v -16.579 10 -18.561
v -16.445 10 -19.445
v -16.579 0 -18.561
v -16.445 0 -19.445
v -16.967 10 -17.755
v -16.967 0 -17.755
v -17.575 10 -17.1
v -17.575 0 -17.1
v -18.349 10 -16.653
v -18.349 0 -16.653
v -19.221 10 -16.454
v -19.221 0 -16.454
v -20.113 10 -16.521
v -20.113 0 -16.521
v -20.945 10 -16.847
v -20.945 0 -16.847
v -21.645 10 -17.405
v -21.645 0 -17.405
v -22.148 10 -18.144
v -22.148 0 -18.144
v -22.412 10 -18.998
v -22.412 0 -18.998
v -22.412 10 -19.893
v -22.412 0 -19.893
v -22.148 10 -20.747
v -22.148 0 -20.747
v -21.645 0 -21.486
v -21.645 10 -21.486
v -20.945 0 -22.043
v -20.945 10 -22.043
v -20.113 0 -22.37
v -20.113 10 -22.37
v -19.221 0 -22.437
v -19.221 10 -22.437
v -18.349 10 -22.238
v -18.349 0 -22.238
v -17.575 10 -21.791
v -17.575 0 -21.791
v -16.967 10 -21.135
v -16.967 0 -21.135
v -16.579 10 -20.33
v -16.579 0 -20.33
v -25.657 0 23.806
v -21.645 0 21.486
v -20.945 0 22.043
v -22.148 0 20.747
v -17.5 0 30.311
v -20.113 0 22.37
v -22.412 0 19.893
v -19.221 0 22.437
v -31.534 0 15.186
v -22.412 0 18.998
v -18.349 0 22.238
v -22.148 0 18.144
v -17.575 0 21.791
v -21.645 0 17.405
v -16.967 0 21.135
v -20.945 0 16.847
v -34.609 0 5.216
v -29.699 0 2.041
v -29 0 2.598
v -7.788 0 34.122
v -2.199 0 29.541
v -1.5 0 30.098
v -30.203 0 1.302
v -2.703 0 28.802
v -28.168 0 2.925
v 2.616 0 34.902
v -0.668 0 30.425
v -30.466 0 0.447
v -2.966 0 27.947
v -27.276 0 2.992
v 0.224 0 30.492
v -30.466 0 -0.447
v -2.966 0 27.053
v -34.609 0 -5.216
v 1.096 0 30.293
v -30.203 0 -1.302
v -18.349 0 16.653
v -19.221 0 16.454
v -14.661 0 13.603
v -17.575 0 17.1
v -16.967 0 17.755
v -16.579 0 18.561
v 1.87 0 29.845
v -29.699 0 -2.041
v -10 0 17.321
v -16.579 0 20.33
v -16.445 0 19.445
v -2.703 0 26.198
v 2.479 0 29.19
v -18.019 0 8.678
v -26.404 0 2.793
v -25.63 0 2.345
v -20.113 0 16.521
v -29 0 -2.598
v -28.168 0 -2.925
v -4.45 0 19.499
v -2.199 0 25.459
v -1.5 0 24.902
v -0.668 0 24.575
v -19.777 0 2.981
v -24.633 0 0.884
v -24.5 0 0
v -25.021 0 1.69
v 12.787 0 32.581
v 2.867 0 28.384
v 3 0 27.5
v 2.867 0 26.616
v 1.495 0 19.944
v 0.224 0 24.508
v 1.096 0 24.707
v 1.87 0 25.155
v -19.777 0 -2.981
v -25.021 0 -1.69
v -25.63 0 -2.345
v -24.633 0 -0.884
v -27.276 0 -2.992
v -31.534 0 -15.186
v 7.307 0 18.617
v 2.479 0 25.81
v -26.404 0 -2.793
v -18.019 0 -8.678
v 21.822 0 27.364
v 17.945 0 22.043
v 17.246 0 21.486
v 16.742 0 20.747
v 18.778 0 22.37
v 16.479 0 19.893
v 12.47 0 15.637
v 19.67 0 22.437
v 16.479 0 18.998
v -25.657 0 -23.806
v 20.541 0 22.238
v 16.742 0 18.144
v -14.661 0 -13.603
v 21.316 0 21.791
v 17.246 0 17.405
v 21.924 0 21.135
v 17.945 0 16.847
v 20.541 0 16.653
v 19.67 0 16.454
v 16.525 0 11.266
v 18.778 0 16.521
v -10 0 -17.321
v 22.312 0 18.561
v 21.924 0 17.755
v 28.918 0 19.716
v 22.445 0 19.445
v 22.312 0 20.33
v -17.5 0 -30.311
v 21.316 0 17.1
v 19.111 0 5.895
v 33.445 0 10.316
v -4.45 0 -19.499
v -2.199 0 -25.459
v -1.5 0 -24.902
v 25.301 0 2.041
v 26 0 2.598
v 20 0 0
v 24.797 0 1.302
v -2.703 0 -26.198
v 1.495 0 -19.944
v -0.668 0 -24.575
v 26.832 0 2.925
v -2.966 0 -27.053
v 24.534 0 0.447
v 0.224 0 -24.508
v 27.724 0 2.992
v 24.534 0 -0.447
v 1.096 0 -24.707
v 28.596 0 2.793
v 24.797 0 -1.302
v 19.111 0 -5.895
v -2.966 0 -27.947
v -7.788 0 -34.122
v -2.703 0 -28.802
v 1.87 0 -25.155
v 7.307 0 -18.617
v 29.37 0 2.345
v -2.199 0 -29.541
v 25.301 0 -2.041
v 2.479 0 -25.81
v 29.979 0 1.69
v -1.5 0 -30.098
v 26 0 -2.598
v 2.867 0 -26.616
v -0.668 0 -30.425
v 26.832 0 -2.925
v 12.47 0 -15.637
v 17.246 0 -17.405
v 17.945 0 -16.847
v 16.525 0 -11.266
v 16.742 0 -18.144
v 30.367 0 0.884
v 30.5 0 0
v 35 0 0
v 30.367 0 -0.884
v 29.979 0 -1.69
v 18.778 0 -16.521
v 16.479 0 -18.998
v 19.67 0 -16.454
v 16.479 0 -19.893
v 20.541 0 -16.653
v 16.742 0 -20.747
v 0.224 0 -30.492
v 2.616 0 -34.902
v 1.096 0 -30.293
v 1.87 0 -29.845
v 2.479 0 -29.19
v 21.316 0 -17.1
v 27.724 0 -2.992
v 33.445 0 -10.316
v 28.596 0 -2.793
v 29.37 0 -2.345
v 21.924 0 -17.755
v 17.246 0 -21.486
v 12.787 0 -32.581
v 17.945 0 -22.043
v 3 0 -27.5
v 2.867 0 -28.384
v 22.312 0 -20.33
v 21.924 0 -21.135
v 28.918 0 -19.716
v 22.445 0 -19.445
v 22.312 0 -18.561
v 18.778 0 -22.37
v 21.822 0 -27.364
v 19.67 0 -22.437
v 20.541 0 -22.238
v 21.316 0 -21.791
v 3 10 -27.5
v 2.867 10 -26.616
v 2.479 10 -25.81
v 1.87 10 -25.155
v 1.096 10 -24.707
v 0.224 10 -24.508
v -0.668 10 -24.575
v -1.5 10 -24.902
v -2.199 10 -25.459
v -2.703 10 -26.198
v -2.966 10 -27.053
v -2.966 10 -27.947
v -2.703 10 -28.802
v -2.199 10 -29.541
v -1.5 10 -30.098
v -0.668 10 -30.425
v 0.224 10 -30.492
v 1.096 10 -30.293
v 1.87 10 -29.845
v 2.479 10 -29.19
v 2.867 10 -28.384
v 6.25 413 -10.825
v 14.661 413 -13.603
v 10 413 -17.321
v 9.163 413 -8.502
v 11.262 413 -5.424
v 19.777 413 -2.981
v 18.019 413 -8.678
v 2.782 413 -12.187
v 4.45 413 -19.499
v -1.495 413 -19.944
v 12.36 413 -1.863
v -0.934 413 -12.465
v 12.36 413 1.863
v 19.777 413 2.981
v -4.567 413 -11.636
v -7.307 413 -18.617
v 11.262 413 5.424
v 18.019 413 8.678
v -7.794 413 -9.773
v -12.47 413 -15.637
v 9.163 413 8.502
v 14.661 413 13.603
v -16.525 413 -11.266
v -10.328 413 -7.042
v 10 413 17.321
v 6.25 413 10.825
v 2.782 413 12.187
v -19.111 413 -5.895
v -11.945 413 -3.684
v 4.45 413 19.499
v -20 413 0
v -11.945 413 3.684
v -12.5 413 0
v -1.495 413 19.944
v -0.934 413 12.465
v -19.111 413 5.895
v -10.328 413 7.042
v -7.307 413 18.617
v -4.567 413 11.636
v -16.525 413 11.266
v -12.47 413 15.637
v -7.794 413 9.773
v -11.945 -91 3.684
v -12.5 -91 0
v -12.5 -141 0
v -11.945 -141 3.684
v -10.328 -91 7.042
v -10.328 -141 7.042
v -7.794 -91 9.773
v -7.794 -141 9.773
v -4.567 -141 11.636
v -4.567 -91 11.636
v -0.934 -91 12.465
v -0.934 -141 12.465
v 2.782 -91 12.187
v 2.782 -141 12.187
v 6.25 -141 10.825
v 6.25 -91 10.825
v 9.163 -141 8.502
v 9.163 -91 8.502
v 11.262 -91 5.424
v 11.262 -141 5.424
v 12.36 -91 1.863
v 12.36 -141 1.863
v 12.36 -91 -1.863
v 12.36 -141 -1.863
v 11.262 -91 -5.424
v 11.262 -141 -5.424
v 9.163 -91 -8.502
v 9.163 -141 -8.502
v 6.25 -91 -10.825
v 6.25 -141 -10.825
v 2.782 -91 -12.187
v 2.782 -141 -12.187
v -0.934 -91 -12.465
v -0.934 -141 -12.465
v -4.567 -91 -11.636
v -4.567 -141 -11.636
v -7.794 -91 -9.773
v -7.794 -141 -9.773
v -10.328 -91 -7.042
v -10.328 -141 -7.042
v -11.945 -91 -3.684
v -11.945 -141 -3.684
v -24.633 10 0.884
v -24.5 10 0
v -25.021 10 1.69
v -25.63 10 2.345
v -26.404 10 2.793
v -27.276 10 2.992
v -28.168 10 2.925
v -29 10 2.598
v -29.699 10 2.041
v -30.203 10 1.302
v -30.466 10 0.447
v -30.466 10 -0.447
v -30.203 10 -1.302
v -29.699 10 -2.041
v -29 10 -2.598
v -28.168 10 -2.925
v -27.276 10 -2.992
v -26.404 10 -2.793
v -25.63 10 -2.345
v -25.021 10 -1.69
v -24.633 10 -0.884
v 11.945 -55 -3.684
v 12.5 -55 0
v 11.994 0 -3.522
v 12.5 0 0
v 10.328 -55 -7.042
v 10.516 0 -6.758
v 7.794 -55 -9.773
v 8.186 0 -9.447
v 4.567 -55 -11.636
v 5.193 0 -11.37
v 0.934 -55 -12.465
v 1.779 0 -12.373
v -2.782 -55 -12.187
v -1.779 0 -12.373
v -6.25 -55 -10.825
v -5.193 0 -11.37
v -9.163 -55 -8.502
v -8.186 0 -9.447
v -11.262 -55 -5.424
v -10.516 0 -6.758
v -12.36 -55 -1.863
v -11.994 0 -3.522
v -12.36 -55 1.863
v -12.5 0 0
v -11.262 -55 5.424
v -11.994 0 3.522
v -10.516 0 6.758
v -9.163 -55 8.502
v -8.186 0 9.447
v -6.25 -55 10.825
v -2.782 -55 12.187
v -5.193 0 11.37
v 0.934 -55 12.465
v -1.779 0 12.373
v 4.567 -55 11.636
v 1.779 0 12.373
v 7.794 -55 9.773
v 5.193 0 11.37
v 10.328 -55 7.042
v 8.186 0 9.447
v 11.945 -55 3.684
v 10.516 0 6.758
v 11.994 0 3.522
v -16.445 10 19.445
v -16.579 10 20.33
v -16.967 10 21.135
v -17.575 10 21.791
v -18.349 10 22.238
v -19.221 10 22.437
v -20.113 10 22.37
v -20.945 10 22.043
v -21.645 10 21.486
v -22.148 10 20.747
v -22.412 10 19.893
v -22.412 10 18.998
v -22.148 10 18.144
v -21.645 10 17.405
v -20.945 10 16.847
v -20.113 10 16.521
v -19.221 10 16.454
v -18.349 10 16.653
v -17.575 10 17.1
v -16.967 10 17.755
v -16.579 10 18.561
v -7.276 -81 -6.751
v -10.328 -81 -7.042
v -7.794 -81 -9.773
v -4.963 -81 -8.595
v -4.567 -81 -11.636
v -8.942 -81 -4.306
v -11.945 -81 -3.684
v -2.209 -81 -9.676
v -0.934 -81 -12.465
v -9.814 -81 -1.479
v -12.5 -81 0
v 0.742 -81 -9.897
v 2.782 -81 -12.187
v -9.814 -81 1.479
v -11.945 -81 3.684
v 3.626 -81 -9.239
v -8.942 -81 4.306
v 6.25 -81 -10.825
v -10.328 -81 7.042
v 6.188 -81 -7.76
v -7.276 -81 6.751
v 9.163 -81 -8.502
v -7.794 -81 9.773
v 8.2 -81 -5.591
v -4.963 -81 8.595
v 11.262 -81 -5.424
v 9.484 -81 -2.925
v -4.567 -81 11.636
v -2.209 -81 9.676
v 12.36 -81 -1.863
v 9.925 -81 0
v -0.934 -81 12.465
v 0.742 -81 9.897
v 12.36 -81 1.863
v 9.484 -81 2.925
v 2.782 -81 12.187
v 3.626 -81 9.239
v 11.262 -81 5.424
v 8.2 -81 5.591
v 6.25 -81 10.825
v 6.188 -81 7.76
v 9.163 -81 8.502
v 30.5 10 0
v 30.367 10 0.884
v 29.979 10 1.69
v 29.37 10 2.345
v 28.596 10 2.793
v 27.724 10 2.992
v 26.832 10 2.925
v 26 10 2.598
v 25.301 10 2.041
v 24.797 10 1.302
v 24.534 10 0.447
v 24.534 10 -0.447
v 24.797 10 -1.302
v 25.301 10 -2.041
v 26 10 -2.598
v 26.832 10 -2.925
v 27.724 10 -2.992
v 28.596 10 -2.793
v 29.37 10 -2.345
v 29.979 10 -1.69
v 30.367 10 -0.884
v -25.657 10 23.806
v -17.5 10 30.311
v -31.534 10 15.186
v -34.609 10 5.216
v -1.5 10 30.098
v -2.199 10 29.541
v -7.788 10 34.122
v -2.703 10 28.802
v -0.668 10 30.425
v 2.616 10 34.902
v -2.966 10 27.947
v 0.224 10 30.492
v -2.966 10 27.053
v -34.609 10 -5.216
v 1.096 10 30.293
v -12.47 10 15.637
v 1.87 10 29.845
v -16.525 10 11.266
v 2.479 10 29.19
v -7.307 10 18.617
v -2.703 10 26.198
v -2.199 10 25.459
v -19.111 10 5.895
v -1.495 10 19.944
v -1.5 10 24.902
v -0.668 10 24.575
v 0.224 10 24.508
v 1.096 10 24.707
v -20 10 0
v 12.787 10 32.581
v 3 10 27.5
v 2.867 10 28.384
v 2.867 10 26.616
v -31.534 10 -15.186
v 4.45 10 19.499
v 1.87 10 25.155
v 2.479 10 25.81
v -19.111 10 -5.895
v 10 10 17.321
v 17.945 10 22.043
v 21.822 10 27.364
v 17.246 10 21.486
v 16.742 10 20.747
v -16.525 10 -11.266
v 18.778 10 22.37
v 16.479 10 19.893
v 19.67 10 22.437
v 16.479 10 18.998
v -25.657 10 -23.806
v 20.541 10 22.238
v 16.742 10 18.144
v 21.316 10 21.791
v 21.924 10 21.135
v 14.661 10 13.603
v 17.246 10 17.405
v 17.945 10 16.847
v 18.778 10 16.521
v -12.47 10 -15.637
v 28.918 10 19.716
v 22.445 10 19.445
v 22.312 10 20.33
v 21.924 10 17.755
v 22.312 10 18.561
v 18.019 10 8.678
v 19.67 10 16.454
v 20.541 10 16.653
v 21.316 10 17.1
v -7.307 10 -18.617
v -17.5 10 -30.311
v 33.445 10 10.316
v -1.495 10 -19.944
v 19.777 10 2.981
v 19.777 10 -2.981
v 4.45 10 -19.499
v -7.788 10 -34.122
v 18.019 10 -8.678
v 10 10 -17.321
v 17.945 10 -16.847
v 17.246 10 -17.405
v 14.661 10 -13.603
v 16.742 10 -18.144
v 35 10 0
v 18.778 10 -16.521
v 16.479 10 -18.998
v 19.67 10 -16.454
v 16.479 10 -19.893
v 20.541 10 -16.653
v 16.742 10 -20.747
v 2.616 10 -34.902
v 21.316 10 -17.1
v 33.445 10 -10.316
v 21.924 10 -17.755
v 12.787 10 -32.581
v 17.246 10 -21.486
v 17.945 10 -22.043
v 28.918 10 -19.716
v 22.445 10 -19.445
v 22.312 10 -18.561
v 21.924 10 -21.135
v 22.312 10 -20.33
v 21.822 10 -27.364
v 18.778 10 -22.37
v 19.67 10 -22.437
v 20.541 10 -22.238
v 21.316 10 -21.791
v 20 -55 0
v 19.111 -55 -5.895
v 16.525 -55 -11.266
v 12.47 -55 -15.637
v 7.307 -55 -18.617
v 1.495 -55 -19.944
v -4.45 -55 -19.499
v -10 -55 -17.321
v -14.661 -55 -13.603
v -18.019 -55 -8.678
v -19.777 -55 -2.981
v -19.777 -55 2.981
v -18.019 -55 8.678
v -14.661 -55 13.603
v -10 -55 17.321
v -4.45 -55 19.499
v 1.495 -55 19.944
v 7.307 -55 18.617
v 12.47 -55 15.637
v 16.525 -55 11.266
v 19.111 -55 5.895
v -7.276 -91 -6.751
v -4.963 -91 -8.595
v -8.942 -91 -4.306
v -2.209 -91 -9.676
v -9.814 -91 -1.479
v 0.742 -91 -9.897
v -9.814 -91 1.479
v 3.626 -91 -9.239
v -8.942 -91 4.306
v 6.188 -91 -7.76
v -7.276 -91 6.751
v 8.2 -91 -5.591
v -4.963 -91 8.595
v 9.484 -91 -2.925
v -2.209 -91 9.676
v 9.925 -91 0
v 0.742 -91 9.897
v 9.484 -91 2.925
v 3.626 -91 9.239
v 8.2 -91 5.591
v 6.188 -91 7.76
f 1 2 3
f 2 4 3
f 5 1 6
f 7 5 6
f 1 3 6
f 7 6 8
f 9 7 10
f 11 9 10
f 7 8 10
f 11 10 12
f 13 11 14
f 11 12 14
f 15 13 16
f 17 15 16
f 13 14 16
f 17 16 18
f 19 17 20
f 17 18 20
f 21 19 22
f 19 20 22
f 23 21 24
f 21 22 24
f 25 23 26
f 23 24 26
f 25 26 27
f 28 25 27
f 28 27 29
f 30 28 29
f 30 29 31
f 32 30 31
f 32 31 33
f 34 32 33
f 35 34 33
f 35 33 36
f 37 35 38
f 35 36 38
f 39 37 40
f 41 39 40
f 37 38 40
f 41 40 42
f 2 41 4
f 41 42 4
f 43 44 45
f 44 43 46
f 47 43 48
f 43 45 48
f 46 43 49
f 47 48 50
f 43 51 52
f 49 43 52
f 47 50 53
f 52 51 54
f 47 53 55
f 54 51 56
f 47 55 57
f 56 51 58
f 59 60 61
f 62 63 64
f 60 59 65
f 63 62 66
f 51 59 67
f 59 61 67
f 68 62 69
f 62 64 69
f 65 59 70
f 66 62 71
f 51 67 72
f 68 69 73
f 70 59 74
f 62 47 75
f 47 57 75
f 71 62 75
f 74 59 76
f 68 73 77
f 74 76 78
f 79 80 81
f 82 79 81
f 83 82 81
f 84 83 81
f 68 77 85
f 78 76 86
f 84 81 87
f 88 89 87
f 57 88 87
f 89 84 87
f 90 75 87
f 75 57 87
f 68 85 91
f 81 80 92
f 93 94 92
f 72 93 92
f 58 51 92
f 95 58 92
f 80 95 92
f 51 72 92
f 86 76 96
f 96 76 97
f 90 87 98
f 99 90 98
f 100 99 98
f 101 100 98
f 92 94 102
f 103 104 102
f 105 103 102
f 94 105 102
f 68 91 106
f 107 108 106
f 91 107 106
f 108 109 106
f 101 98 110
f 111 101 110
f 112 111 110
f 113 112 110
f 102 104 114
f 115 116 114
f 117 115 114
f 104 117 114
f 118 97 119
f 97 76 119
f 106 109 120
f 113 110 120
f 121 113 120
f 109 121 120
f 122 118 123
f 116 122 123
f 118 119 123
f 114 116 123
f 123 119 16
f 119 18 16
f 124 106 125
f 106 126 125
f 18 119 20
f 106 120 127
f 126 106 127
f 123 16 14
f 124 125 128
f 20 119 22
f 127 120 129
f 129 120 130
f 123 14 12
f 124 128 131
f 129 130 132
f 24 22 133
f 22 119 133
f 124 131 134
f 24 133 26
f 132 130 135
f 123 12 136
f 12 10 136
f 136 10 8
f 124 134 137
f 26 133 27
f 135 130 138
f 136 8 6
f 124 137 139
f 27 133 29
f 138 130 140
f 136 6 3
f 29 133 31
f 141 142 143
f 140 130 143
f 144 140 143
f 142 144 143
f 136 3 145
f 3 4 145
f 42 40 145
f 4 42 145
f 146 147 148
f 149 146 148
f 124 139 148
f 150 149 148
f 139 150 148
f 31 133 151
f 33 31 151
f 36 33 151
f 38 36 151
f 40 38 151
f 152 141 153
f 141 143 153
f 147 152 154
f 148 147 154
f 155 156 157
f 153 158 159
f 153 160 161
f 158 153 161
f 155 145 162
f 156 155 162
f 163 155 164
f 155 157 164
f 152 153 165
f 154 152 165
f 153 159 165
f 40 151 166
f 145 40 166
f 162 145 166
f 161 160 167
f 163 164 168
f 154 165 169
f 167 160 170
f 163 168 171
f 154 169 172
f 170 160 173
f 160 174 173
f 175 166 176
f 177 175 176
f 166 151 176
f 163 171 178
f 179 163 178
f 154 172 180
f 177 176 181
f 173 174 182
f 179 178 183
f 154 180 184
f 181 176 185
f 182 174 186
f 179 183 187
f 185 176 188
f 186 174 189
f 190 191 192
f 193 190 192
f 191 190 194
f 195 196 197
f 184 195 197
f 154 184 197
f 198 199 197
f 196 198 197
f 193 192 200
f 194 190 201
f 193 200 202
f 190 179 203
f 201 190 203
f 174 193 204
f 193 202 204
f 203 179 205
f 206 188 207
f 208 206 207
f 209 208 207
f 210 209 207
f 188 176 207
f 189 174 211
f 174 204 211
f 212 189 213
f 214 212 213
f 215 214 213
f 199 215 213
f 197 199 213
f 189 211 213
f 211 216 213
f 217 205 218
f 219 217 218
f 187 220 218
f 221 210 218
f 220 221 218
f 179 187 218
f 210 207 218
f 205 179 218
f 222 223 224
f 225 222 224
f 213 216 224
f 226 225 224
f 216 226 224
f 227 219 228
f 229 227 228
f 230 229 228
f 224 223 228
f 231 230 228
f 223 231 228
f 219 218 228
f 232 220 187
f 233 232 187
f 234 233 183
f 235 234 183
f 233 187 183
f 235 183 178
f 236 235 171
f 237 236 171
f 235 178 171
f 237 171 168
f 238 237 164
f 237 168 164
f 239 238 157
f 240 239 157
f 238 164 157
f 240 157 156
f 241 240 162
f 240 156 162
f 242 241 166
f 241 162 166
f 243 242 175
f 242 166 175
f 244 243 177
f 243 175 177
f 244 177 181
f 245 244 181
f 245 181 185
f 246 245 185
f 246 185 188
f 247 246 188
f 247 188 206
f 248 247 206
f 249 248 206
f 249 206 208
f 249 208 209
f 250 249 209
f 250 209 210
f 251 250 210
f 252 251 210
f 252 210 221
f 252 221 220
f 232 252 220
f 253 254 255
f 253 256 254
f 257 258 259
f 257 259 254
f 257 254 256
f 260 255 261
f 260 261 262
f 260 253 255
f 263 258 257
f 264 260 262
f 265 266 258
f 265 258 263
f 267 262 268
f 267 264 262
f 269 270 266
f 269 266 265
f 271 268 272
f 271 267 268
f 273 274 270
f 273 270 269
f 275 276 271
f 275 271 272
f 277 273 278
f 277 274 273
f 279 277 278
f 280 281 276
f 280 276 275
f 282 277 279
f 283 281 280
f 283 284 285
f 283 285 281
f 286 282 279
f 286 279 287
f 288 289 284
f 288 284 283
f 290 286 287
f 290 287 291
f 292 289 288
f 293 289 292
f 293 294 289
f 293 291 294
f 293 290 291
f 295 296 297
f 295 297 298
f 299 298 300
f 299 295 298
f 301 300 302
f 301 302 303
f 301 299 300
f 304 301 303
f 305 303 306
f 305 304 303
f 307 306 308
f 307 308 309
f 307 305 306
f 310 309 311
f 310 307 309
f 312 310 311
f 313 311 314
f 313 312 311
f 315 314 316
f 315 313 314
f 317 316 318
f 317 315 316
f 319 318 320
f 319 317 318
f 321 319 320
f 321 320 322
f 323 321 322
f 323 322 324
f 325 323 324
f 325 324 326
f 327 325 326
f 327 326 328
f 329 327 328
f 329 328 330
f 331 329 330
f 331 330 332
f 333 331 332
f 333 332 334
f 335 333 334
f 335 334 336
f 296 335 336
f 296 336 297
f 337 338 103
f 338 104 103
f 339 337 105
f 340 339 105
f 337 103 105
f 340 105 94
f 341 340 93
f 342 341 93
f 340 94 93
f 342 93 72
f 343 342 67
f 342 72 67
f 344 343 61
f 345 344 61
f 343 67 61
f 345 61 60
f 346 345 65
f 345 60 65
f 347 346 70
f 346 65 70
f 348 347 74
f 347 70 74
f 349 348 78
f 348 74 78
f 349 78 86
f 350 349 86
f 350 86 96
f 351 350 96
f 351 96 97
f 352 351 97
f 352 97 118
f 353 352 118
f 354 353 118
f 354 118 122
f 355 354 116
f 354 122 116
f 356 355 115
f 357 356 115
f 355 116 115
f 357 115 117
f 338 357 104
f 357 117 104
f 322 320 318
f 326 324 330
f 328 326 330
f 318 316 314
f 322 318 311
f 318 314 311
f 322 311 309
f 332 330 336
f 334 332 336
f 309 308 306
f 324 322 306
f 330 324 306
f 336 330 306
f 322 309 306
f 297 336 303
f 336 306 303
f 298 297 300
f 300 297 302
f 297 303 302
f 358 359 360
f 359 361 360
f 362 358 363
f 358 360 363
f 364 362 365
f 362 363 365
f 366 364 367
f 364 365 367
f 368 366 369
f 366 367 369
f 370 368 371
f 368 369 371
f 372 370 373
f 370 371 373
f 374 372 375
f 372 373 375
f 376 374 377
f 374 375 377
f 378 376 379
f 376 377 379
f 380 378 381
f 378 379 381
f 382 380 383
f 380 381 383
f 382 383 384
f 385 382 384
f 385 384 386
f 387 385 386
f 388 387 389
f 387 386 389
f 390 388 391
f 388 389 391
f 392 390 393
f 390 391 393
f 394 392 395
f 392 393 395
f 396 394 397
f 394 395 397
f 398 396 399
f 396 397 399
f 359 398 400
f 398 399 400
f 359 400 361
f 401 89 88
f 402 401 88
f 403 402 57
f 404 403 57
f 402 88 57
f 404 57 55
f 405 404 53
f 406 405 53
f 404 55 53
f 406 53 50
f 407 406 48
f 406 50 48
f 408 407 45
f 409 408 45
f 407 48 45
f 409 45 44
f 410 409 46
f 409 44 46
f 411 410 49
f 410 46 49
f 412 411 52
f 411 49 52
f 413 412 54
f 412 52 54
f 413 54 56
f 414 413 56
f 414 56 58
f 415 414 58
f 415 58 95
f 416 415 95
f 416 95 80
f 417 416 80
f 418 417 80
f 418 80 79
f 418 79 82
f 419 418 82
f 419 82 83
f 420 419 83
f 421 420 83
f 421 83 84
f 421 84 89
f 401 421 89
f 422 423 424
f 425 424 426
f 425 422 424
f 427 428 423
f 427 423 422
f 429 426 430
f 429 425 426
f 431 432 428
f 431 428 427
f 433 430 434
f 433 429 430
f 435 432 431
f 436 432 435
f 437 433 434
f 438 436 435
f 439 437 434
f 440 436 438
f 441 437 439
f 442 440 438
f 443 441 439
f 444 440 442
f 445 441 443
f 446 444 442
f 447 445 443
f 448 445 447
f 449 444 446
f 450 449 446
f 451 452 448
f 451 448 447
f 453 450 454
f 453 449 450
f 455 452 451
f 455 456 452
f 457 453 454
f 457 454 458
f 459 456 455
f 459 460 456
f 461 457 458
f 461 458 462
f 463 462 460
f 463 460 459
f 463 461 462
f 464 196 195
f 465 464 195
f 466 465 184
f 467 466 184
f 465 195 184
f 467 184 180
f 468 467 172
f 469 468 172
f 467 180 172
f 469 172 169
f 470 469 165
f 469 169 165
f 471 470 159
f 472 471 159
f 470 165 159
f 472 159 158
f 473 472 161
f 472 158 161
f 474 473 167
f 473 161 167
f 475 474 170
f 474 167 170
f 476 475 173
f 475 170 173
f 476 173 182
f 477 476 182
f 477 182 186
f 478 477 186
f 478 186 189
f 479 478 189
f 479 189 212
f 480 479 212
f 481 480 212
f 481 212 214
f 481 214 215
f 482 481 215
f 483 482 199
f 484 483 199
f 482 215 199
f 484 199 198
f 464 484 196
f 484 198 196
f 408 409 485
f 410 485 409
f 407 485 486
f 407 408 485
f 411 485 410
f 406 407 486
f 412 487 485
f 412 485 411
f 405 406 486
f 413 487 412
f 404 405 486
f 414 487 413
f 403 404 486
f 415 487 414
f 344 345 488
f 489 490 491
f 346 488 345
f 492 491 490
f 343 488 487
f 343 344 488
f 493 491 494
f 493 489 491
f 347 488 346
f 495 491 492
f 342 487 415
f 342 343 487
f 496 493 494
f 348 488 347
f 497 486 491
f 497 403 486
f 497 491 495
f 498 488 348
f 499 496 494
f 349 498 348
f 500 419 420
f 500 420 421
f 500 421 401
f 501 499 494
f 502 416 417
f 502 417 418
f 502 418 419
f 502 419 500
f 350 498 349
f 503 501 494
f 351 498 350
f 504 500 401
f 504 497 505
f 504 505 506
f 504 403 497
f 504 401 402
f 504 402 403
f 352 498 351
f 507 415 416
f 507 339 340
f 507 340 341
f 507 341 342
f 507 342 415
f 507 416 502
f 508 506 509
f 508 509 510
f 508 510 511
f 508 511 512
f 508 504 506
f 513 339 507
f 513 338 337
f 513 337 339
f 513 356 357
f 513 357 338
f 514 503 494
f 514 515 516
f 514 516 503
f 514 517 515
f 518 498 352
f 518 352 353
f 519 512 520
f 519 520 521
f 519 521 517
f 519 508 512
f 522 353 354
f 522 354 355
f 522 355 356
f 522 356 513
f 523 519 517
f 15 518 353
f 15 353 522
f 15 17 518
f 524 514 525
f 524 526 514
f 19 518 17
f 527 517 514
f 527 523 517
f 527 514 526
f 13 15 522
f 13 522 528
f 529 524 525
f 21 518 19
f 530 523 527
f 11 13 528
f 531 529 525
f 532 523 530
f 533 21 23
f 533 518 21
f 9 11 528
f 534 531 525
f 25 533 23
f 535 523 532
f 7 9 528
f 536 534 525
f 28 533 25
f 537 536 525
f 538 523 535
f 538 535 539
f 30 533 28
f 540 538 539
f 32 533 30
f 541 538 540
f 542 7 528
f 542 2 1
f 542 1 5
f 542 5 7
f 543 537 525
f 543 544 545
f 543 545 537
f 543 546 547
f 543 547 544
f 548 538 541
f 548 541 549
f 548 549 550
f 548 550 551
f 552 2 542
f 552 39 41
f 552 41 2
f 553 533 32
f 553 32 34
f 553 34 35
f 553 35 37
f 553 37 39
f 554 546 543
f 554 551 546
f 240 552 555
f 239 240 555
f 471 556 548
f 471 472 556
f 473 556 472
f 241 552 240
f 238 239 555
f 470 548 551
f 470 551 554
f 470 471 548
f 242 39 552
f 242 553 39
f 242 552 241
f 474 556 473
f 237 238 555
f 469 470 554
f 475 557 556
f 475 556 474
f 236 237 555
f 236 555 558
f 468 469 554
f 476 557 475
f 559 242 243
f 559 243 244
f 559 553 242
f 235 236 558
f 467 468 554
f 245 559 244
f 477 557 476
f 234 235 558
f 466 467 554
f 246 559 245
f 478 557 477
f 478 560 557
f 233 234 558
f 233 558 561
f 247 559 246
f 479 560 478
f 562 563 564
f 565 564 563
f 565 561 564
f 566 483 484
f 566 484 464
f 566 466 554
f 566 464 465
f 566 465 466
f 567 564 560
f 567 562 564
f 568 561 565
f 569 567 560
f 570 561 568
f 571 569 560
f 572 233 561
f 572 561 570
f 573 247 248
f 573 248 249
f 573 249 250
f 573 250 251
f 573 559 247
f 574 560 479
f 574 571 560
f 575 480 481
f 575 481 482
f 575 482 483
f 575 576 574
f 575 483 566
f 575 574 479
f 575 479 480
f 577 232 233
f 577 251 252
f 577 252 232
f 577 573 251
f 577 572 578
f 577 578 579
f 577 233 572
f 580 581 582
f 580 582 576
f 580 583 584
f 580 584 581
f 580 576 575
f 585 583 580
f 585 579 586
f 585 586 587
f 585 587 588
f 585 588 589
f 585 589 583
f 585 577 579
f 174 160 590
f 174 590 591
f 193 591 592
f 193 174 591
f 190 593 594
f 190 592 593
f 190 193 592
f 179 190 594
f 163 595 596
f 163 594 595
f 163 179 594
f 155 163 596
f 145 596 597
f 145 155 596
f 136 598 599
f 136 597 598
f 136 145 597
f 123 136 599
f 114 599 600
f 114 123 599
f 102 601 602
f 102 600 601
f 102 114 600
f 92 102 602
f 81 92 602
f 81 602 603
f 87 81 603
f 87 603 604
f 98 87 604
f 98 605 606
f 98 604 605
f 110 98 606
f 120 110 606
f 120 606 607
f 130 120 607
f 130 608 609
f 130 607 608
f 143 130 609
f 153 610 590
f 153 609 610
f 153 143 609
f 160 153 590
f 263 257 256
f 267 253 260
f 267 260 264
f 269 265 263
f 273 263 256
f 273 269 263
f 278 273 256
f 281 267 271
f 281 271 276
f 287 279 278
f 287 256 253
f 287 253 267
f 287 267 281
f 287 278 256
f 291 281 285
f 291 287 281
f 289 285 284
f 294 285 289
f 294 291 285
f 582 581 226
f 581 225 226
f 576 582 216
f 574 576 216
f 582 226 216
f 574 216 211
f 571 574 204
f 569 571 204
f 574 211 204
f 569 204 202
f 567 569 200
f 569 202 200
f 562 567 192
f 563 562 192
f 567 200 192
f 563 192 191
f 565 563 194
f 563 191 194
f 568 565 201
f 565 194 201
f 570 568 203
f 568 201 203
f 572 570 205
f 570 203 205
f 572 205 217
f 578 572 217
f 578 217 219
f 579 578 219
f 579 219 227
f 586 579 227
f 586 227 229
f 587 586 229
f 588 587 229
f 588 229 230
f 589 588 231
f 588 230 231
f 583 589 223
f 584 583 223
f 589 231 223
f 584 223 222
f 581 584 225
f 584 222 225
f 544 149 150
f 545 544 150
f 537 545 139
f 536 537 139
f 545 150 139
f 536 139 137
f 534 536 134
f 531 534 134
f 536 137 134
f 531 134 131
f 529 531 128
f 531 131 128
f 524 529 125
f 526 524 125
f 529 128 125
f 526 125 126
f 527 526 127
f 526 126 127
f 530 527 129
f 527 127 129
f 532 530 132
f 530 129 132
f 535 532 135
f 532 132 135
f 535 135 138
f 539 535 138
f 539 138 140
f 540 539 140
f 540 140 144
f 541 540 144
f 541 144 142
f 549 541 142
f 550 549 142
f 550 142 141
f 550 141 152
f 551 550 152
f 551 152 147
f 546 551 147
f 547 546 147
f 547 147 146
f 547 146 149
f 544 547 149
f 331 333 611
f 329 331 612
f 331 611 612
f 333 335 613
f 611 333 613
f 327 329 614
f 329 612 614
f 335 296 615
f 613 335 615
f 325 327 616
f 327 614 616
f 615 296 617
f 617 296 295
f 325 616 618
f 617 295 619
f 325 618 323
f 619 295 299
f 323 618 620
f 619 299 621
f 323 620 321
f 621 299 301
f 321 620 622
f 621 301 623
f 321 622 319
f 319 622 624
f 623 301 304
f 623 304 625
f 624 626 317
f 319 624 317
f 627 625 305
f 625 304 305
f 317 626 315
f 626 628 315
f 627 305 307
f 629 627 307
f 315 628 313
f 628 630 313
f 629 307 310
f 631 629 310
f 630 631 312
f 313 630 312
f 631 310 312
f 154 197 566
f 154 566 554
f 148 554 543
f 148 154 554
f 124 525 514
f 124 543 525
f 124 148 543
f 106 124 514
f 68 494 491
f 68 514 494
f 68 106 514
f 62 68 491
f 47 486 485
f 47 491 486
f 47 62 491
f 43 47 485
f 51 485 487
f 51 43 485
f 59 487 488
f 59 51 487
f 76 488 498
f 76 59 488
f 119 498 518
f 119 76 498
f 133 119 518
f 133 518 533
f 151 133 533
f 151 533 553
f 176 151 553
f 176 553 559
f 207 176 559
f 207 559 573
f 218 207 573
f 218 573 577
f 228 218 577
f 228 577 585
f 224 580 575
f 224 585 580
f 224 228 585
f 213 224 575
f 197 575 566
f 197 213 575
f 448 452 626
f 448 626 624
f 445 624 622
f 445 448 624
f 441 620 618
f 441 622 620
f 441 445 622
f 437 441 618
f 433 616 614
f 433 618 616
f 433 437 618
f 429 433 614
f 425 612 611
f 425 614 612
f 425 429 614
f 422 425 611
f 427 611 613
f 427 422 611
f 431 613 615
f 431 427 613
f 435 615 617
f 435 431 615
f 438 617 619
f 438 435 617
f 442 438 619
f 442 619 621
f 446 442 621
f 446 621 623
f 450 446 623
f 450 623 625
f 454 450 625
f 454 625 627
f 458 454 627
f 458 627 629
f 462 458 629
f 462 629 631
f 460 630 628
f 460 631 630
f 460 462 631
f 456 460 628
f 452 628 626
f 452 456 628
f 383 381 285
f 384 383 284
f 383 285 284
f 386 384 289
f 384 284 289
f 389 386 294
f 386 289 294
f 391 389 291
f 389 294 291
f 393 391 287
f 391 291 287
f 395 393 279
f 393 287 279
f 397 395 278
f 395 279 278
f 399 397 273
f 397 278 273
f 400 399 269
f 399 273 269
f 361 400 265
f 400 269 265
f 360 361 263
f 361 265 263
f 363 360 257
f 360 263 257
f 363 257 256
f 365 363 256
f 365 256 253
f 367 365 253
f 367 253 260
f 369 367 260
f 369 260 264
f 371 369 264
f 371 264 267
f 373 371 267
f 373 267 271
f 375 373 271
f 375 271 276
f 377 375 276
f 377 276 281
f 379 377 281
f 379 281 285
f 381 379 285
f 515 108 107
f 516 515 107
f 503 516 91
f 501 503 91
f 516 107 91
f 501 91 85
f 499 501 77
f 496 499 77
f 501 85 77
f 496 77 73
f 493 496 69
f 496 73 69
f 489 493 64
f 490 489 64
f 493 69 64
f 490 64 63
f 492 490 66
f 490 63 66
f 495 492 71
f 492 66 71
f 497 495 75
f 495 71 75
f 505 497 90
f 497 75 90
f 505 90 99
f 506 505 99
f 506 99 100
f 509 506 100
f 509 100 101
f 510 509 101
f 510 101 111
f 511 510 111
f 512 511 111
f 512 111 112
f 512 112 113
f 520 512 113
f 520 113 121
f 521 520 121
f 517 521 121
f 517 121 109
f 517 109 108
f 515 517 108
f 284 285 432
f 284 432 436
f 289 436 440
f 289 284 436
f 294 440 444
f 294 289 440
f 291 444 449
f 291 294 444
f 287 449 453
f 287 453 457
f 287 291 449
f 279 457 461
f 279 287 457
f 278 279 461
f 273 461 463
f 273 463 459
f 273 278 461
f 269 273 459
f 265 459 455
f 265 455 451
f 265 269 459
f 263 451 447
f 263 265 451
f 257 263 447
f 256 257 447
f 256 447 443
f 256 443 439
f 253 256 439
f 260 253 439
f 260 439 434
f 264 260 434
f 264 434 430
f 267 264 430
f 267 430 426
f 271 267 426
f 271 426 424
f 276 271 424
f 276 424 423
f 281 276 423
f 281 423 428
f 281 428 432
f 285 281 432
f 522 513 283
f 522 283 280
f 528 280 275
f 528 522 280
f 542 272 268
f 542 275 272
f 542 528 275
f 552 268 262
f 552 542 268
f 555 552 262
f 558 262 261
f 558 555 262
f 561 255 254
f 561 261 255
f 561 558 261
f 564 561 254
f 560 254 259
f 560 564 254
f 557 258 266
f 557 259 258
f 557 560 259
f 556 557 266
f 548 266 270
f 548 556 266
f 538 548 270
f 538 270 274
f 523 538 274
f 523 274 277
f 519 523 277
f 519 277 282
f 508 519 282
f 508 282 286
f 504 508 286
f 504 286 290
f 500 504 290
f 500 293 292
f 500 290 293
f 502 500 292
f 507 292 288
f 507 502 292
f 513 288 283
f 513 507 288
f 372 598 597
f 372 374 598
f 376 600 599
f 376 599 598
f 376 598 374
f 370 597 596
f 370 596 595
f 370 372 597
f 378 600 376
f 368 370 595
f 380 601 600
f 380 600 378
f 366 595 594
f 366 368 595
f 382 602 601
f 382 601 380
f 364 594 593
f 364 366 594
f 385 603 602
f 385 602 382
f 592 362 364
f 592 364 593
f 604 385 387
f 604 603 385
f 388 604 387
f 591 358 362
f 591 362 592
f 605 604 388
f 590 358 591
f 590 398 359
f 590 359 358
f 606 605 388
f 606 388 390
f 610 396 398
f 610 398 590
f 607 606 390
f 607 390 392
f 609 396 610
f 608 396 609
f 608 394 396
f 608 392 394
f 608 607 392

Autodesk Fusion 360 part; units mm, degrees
sketch "Sketch1" plane through (0, 0, 0) normal (0, 1, 0) x (1, 0, 0)
  circle A0 centre (0, 0) radius 35
  dimension "d1" = 70
extrude "Extrude1" add sketch "Sketch1" along normal blind 10 makes body 1
sketch "Sketch2" plane through (0, 10, 0) normal (0, 1, 0) x (-1, 0, 0)
  circle A0 centre (0, 0) radius 35
  circle A1 centre (0, 0) radius 20
  dimension "d4" = 40
extrude "Extrude2" add sketch "Sketch2" along normal blind 403 contours A1 bodies 1
sketch "Sketch3" plane through (0, 413, 0) normal (0, 1, 0) x (-1, 0, 0)
  circle A0 centre (0, 0) radius 20
sketch "Sketch4" plane through (0, 413, 0) normal (0, 1, 0) x (-1, 0, 0)
  circle A0 centre (0, 0) radius 12.5
  dimension "d7" = 25
extrude "Extrude3" cut sketch "Sketch4" against normal blind 440 bodies 1
sketch "Sketch5" plane through (0, 0, 0) normal (0, -1, 0) x (1, 0, 0)
  circle A0 centre (0, 0) radius 12.5
  circle A1 centre (0, 0) radius 35
  circle A2 centre (0, 0) radius 20
  dimension "d10" = 40
extrude "Extrude4" add sketch "Sketch5" along normal blind 55 contours A2 bodies 1
sketch "Sketch6" plane through (0, 0, 0) normal (0, -1, 0) x (1, 0, 0)
  circle A0 centre (0, 0) radius 20
  circle A1 centre (0, 0) radius 35
  circle A2 centre (0, 27.5) radius 3
  circle A3 centre (-19.4454, 19.4454) radius 3
  circle A4 centre (-27.5, 0) radius 3
  circle A5 centre (-19.4454, -19.4454) radius 3
  circle A6 centre (0, -27.5) radius 3
  circle A7 centre (19.4454, -19.4454) radius 3
  circle A8 centre (27.5, 0) radius 3
  circle A9 centre (19.4454, 19.4454) radius 3
  dimension "d16" = 360
extrude "Extrude5" cut sketch "Sketch6" against normal blind 50 contours A2 | A3 | A4 | A5 | A6 | A7 | A8 | A9 bodies 1
sketch "Sketch7" plane through (0, 413, 0) normal (0, 1, 0) x (-1, 0, 0)
  circle A0 centre (0, 0) radius 12.5
extrude "Extrude6" add sketch "Sketch7" against normal blind 468 separate body makes body 2
extrude "Extrude7" add 1 faces at (3.3879, -55, -0.621) along direction (0, -1, 0) blind 86 separate body on bodies 2 makes body 3
combine "Combine1" operation add target body 2 tool bodies 3
ref_plane "WorkPlane1" through (0, -81, 0) normal (0, -1, 0) x (1, 0, 0)
sketch "Sketch8" plane through (0, -81, 0) normal (0, -1, 0) x (1, 0, 0)
  circle A0 centre (0, 0) radius 9.925
  circle A1 centre (0, 0) radius 13
  dimension "d24" = 19.85
  dimension "d25" = 26
extrude "Extrude8" add sketch "Sketch8" along normal blind 10 separate body makes body 4
combine "Combine2" operation cut target body 2 tool bodies 4
equation "d16 = 360.0 °"
